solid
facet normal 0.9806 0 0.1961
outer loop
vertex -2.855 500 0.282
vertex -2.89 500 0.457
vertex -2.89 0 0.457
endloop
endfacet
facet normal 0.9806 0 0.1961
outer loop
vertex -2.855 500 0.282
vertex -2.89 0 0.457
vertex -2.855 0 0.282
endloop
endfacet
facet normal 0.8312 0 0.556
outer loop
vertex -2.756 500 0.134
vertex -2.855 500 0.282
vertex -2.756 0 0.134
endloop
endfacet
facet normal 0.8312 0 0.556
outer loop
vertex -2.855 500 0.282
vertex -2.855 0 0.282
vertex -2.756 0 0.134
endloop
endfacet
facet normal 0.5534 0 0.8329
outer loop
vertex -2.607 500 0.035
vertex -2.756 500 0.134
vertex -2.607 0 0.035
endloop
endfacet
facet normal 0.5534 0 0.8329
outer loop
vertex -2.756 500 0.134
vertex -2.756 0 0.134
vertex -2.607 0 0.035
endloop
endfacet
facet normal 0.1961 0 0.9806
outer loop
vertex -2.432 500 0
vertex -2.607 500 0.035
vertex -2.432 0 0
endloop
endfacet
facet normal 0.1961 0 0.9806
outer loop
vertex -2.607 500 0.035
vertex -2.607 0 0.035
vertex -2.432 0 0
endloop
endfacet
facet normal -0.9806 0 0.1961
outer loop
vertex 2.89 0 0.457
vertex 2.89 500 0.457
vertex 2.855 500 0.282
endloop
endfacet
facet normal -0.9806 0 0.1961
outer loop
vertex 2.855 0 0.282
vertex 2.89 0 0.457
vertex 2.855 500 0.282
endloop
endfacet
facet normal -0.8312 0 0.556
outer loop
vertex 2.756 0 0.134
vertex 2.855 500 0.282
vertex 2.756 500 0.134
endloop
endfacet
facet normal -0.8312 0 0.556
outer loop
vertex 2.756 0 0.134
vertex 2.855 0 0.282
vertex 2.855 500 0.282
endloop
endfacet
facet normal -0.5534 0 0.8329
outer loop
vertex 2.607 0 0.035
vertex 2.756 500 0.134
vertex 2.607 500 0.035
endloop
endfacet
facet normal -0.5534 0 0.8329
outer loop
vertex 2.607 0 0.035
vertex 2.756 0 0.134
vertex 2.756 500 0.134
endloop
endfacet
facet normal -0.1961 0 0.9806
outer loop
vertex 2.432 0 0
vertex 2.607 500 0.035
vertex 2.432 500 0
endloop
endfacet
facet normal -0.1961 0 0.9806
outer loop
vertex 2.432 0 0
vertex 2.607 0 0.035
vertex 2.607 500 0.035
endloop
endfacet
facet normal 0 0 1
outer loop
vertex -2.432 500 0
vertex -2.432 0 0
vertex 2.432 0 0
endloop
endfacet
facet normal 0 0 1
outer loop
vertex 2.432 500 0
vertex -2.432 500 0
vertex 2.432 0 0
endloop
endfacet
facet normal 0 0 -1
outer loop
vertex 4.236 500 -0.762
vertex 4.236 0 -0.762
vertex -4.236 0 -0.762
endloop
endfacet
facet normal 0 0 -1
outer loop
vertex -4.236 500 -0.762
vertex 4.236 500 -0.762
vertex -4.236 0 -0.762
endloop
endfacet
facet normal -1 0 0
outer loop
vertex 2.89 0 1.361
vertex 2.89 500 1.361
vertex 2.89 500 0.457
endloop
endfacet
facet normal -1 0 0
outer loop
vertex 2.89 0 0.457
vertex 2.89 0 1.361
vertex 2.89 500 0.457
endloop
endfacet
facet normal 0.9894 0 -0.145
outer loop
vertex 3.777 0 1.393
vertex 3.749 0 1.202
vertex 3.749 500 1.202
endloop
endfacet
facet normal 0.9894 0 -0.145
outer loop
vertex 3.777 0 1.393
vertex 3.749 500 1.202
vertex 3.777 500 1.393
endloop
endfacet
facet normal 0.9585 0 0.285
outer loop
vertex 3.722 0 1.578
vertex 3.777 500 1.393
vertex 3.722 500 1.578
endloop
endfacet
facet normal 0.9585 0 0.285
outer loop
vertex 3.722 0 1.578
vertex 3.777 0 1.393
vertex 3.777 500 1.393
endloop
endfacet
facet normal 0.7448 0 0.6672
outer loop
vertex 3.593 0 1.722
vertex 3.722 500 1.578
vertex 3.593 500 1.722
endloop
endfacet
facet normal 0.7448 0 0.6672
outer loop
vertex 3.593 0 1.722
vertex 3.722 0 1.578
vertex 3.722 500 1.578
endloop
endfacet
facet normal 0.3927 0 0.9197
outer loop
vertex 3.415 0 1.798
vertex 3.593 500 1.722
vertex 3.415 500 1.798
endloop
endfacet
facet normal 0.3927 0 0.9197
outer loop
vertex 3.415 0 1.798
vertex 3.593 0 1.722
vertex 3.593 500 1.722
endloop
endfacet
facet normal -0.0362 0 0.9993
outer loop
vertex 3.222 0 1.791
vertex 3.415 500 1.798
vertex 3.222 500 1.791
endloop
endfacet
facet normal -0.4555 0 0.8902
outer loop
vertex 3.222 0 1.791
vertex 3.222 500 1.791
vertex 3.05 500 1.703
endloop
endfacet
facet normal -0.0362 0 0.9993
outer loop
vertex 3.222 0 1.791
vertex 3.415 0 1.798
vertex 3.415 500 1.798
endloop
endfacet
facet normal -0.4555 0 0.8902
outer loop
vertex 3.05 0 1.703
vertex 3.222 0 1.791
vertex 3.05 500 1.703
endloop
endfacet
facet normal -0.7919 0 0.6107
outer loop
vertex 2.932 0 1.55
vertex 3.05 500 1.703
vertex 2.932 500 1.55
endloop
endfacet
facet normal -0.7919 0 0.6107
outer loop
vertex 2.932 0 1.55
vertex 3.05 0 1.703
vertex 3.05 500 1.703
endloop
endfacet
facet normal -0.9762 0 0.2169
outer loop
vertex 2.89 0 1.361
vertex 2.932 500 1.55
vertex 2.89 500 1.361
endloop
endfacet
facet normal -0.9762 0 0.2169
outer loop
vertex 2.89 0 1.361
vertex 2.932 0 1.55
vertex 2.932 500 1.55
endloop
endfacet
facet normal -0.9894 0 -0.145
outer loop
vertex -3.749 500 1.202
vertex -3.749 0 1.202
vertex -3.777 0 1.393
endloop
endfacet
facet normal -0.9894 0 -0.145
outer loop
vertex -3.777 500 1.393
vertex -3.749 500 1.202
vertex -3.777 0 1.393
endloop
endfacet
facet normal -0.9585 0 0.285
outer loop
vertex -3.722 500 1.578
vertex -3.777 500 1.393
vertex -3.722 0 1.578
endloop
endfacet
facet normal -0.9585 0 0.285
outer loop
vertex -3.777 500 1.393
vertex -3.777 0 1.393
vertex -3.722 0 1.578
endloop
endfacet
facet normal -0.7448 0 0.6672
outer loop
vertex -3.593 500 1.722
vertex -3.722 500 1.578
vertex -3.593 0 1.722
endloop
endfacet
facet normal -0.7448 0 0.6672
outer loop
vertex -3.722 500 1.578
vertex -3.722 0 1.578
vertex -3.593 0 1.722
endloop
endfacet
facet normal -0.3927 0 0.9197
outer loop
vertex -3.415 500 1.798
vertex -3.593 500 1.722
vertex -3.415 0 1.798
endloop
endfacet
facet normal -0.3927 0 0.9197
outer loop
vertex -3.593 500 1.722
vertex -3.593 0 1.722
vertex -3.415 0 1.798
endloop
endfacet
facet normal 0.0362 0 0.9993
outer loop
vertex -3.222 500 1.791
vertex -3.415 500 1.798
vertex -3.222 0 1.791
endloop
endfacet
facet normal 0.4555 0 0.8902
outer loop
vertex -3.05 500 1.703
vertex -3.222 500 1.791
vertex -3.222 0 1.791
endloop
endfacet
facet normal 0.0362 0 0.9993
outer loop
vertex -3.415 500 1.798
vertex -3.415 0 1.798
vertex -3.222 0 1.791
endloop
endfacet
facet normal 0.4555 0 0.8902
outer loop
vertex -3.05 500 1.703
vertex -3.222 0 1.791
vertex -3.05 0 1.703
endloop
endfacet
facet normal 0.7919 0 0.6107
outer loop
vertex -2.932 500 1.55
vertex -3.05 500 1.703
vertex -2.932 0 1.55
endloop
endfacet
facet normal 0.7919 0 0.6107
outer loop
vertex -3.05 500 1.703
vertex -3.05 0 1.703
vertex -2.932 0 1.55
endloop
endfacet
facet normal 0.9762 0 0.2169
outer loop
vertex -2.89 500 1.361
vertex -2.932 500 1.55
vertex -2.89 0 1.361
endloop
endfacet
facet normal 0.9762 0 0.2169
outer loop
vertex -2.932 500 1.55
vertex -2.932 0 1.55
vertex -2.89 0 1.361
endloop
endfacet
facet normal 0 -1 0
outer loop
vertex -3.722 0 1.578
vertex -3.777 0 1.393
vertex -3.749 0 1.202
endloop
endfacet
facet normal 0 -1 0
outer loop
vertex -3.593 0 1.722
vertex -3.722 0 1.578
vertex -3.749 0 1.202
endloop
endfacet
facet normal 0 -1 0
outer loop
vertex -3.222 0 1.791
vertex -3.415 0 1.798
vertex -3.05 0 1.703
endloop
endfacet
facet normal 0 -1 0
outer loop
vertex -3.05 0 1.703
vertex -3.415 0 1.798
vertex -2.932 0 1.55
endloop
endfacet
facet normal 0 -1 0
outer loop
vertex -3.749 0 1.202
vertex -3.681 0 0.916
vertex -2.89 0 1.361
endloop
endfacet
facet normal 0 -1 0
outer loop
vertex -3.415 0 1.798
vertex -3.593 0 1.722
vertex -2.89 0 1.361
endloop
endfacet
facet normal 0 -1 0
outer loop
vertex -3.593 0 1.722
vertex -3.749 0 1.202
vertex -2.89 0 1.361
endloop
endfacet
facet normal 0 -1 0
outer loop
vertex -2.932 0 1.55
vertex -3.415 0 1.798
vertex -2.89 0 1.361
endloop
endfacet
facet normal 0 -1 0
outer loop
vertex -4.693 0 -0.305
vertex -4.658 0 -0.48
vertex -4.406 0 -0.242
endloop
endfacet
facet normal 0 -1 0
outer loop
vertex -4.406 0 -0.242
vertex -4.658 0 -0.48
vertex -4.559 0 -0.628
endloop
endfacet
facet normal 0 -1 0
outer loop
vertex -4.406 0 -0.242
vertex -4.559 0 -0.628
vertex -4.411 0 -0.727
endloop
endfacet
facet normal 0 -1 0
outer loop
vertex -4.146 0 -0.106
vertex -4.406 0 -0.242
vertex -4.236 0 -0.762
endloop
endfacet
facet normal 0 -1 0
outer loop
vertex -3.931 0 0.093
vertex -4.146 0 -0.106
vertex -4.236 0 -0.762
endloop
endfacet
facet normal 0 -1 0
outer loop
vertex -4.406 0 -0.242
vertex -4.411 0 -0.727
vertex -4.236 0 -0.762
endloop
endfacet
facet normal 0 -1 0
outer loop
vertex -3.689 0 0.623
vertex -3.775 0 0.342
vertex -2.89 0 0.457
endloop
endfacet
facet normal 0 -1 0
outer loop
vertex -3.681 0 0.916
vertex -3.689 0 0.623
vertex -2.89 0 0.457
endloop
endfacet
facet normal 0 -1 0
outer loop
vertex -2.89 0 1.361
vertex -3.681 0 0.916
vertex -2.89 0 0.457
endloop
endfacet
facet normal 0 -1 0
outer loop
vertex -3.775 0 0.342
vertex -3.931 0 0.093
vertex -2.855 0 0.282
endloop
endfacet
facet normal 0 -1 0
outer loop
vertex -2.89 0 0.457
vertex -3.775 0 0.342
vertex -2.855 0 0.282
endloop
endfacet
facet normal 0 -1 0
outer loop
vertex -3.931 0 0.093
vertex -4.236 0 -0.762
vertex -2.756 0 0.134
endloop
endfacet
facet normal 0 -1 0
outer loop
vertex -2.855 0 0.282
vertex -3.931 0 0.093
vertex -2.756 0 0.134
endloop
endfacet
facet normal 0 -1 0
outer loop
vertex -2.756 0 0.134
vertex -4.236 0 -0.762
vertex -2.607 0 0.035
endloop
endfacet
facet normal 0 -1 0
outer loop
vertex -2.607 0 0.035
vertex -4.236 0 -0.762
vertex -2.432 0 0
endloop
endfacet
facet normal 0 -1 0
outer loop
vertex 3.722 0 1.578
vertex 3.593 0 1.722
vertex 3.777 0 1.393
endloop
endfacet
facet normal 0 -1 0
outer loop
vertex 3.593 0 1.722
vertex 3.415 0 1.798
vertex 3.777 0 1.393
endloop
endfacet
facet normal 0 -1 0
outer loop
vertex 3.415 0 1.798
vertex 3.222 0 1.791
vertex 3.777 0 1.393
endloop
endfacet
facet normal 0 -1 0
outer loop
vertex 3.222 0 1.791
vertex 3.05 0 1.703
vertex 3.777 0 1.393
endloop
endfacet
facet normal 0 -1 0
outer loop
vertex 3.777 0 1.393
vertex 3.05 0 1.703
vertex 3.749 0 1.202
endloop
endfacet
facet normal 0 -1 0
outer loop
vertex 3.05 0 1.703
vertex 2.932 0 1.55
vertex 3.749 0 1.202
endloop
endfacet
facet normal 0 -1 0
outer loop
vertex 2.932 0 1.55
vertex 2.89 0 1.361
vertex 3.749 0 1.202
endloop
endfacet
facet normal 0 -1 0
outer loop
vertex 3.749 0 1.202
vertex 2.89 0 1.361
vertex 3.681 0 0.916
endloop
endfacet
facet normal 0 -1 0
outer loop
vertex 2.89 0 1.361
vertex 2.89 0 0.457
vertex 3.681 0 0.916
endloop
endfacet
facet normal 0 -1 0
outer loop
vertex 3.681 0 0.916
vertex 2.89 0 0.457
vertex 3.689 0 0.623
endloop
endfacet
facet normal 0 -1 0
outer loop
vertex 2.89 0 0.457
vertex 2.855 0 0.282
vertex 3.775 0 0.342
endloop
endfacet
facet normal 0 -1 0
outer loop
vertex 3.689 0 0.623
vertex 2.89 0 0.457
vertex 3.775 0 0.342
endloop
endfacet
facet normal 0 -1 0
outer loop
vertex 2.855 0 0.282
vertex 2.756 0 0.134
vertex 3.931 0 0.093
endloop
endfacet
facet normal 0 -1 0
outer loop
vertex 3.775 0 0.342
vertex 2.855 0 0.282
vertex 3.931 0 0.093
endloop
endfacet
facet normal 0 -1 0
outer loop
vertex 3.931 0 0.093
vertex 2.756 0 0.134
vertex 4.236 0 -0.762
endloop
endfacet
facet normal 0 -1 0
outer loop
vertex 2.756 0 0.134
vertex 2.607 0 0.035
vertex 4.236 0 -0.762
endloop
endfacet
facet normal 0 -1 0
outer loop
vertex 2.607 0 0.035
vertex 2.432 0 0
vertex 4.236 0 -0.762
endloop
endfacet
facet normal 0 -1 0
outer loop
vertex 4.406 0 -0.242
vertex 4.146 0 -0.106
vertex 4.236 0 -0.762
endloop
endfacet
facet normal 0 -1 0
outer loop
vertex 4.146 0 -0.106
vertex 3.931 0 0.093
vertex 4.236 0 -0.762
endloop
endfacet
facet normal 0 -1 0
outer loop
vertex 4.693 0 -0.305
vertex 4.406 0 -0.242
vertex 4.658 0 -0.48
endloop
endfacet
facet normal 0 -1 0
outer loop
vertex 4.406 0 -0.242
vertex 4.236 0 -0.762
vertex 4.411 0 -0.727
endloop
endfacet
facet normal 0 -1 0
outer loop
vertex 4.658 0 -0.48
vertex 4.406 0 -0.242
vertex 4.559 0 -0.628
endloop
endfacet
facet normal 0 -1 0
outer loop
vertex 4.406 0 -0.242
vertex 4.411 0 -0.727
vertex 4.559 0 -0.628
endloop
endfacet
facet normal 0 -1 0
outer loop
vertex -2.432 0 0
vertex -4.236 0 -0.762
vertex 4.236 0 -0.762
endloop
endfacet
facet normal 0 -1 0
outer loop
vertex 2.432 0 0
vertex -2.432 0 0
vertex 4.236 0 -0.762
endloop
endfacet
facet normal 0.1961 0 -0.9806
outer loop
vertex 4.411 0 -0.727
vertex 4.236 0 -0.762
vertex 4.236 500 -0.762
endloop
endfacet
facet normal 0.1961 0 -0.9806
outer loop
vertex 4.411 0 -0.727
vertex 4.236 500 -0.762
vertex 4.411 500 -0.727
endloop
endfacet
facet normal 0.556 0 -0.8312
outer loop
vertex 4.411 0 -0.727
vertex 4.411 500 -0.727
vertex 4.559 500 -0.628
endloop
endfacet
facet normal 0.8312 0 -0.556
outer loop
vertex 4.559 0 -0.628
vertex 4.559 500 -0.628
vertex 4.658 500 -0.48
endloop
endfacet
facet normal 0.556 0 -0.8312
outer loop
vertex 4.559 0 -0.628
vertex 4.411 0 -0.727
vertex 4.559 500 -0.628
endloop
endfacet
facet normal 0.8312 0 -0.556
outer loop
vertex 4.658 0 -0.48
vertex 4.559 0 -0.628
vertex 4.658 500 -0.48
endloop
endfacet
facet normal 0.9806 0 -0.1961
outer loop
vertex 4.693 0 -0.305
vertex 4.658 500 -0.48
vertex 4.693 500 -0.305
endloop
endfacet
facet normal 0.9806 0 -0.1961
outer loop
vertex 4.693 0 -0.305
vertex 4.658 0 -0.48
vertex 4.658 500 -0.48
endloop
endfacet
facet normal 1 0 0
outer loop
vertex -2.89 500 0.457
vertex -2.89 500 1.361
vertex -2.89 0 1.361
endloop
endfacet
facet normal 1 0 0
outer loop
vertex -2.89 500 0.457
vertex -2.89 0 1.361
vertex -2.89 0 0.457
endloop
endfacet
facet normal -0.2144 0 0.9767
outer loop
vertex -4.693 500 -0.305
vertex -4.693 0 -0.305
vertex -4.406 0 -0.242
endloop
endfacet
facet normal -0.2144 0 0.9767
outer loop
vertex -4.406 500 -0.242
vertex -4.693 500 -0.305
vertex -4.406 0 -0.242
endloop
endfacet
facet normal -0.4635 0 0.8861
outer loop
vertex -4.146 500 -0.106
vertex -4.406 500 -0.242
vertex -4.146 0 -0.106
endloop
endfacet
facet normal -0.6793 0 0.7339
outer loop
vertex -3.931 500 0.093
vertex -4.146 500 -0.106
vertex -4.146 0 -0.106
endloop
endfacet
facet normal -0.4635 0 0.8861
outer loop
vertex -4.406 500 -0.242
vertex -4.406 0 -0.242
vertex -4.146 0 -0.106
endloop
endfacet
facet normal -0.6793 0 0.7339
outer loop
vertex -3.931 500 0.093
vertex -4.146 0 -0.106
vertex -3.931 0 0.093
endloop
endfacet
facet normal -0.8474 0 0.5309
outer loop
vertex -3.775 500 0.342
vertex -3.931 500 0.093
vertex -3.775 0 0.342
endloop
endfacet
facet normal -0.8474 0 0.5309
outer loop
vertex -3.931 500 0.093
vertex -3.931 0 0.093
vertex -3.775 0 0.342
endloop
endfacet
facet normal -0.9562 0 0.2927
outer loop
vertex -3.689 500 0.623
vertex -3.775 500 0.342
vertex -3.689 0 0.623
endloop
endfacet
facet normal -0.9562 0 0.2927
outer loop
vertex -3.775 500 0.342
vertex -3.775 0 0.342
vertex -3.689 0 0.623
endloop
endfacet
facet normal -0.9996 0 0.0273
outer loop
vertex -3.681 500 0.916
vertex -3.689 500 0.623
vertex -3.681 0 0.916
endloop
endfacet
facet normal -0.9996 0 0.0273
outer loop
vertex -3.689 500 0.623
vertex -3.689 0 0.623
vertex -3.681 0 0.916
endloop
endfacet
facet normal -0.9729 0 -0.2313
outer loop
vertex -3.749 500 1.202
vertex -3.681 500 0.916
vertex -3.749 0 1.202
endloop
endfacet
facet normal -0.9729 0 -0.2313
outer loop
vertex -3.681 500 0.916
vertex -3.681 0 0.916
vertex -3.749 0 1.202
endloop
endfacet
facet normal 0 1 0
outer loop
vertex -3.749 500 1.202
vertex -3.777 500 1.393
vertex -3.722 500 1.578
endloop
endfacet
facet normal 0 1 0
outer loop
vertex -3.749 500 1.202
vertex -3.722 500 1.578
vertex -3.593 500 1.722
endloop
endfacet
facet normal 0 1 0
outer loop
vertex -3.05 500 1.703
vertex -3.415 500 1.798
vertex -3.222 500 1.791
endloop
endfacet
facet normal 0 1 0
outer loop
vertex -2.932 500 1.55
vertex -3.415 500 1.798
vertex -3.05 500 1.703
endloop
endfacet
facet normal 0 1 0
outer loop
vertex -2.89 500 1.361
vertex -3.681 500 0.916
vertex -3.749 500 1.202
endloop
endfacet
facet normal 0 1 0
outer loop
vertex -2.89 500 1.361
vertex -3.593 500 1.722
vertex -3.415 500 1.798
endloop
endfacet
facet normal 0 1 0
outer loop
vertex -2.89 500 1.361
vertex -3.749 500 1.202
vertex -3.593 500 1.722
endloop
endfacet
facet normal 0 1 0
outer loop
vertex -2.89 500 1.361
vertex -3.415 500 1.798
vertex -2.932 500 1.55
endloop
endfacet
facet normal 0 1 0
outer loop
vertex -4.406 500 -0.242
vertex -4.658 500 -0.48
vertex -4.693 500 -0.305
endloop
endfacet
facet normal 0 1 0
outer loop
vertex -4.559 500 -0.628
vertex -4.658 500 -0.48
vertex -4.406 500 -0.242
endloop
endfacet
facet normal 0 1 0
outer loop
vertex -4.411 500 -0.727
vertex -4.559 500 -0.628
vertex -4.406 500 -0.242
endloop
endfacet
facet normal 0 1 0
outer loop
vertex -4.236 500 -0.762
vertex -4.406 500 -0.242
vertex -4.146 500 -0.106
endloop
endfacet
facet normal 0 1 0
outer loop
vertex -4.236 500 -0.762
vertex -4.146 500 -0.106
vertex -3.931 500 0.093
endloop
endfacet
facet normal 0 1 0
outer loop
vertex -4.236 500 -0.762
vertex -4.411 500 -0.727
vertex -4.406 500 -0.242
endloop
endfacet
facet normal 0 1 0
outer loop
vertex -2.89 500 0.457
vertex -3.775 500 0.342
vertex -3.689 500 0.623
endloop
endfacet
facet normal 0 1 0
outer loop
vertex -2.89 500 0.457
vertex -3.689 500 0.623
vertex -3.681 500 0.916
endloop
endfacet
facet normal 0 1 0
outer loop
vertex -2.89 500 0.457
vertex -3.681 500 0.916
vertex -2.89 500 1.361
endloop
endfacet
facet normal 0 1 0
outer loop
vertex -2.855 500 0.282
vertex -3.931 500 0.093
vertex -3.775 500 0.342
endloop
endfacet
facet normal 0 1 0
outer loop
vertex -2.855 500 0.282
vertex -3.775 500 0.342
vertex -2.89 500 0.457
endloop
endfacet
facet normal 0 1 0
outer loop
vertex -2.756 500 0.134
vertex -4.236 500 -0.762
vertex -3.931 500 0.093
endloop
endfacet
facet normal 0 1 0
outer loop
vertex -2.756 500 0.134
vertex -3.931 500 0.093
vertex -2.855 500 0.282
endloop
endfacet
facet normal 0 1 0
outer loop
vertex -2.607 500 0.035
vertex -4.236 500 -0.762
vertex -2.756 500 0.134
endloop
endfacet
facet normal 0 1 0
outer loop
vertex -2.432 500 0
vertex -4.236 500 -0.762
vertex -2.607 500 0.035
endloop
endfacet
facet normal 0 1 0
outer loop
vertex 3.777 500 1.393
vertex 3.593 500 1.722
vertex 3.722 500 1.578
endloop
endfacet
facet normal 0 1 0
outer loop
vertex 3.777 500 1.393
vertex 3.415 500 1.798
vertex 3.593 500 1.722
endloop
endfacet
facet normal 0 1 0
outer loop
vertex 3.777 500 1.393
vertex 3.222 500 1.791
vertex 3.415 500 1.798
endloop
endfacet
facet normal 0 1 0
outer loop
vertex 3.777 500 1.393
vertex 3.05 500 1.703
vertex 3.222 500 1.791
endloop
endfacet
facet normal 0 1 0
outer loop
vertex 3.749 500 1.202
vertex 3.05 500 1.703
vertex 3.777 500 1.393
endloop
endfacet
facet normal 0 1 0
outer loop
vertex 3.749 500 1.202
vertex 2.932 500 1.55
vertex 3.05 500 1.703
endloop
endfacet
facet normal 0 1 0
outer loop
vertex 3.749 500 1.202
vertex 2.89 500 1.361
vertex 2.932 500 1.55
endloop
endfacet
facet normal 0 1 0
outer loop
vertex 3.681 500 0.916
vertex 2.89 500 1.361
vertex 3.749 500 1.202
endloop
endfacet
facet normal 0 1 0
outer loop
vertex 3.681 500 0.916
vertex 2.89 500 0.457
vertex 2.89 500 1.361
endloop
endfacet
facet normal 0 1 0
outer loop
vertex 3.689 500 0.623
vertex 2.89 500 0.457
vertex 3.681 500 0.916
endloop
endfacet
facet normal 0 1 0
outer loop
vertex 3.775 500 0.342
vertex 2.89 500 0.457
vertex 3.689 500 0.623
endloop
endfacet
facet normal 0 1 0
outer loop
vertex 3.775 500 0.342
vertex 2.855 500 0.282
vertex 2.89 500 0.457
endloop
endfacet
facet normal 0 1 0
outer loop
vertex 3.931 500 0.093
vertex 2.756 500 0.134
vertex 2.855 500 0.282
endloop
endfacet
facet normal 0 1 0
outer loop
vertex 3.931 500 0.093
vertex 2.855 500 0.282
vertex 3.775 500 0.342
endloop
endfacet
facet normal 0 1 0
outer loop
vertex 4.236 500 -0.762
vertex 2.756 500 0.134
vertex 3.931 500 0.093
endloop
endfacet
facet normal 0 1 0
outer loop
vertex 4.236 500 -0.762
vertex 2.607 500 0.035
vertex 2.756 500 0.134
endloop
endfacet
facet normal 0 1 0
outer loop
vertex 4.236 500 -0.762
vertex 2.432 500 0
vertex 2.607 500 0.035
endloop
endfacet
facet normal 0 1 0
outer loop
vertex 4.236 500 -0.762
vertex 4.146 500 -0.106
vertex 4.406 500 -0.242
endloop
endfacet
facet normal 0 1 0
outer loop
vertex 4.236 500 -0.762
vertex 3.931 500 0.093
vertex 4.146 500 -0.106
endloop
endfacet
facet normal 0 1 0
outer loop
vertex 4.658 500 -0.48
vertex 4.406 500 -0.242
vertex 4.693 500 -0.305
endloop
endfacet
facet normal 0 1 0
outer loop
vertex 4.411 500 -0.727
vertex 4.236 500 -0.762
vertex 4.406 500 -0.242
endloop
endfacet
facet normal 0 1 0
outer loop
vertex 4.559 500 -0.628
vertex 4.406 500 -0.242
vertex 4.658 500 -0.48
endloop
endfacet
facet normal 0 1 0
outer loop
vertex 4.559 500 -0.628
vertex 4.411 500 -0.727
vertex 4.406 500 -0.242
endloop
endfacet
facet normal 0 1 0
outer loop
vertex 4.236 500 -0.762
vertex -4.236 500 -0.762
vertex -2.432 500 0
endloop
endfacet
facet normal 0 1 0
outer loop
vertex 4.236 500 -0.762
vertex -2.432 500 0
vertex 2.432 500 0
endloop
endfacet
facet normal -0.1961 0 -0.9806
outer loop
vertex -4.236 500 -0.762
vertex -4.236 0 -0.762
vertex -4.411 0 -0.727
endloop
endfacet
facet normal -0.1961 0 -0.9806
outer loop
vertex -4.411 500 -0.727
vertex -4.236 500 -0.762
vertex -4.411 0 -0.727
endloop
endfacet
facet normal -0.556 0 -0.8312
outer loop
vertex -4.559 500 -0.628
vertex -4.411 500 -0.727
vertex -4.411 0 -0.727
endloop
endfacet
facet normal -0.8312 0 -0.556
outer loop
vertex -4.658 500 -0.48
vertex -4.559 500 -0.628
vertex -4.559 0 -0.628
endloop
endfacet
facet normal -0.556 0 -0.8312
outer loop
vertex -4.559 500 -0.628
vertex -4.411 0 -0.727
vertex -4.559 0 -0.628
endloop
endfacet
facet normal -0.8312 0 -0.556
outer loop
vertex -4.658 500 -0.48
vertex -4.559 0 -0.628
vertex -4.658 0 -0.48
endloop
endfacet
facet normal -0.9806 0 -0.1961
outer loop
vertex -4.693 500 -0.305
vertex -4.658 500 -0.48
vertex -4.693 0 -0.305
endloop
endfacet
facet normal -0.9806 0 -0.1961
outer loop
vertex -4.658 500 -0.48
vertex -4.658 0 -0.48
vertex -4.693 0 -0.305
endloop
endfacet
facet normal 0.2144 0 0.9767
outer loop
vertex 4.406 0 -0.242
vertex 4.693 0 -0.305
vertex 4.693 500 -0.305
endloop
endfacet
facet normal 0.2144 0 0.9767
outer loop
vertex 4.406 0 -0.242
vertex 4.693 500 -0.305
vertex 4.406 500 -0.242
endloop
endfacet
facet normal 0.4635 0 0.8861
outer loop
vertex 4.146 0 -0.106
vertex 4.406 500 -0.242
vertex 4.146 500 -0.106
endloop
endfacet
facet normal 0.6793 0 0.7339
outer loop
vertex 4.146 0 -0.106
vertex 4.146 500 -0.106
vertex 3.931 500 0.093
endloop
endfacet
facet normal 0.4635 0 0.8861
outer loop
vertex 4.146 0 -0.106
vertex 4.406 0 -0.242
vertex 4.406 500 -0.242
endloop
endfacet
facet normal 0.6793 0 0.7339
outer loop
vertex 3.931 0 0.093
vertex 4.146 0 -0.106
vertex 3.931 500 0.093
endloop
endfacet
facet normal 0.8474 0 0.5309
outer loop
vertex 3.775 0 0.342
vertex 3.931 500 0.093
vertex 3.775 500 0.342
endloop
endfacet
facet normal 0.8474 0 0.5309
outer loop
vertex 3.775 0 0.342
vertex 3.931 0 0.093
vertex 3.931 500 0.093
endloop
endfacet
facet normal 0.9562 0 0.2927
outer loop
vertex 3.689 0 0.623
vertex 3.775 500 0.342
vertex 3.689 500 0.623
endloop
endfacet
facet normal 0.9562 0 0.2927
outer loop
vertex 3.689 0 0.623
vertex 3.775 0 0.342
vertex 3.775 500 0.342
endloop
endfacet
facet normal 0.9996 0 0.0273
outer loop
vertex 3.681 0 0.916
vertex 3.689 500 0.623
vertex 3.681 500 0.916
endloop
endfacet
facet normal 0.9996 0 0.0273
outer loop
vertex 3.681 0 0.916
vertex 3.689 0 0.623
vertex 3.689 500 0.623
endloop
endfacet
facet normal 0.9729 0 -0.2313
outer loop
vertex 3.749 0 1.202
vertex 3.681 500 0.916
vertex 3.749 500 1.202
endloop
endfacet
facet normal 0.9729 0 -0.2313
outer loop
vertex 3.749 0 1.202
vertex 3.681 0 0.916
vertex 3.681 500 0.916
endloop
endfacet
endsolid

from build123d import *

# Parameters (mm, degrees)
PROFILE_EXTRUDE_DEPTH = 500


with BuildPart() as part:
    # Profile Sketch → Profile Extrude (new body)
    with BuildSketch(Plane(origin=(0, 0, 0), x_dir=(1, 0, 0), z_dir=(0, 1, 0))):
        with BuildLine():
            Line((0, 0.762), (4.235793346, 0.762))
            ThreePointArc((4.235793346, 0.762), (4.559082566, 0.62808922), (4.692993346, 0.3048))
            ThreePointArc((4.692993346, 0.3048), (3.844388962, -0.212390939), (3.748927066, -1.20158399))
            ThreePointArc((3.748927066, -1.20158399), (3.415292673, -1.798270502), (2.889593346, -1.36125))
            Line((2.889593346, -1.36125), (2.889593346, -0.4572))
            ThreePointArc((2.889593346, -0.4572), (2.755682566, -0.13391078), (2.432393346, 0))
            Line((2.432393346, 0), (0, 0))
            Line((0, 0), (0, 0.762))
        make_face()
    profile_extrude = extrude(amount=PROFILE_EXTRUDE_DEPTH)

    # Profile Mirror: Profile Extrude across plane
    add(profile_extrude.mirror(Plane(origin=(0, 0, 0), x_dir=(0, 0, 1), z_dir=(1, 0, 0))))


solid = part.part
